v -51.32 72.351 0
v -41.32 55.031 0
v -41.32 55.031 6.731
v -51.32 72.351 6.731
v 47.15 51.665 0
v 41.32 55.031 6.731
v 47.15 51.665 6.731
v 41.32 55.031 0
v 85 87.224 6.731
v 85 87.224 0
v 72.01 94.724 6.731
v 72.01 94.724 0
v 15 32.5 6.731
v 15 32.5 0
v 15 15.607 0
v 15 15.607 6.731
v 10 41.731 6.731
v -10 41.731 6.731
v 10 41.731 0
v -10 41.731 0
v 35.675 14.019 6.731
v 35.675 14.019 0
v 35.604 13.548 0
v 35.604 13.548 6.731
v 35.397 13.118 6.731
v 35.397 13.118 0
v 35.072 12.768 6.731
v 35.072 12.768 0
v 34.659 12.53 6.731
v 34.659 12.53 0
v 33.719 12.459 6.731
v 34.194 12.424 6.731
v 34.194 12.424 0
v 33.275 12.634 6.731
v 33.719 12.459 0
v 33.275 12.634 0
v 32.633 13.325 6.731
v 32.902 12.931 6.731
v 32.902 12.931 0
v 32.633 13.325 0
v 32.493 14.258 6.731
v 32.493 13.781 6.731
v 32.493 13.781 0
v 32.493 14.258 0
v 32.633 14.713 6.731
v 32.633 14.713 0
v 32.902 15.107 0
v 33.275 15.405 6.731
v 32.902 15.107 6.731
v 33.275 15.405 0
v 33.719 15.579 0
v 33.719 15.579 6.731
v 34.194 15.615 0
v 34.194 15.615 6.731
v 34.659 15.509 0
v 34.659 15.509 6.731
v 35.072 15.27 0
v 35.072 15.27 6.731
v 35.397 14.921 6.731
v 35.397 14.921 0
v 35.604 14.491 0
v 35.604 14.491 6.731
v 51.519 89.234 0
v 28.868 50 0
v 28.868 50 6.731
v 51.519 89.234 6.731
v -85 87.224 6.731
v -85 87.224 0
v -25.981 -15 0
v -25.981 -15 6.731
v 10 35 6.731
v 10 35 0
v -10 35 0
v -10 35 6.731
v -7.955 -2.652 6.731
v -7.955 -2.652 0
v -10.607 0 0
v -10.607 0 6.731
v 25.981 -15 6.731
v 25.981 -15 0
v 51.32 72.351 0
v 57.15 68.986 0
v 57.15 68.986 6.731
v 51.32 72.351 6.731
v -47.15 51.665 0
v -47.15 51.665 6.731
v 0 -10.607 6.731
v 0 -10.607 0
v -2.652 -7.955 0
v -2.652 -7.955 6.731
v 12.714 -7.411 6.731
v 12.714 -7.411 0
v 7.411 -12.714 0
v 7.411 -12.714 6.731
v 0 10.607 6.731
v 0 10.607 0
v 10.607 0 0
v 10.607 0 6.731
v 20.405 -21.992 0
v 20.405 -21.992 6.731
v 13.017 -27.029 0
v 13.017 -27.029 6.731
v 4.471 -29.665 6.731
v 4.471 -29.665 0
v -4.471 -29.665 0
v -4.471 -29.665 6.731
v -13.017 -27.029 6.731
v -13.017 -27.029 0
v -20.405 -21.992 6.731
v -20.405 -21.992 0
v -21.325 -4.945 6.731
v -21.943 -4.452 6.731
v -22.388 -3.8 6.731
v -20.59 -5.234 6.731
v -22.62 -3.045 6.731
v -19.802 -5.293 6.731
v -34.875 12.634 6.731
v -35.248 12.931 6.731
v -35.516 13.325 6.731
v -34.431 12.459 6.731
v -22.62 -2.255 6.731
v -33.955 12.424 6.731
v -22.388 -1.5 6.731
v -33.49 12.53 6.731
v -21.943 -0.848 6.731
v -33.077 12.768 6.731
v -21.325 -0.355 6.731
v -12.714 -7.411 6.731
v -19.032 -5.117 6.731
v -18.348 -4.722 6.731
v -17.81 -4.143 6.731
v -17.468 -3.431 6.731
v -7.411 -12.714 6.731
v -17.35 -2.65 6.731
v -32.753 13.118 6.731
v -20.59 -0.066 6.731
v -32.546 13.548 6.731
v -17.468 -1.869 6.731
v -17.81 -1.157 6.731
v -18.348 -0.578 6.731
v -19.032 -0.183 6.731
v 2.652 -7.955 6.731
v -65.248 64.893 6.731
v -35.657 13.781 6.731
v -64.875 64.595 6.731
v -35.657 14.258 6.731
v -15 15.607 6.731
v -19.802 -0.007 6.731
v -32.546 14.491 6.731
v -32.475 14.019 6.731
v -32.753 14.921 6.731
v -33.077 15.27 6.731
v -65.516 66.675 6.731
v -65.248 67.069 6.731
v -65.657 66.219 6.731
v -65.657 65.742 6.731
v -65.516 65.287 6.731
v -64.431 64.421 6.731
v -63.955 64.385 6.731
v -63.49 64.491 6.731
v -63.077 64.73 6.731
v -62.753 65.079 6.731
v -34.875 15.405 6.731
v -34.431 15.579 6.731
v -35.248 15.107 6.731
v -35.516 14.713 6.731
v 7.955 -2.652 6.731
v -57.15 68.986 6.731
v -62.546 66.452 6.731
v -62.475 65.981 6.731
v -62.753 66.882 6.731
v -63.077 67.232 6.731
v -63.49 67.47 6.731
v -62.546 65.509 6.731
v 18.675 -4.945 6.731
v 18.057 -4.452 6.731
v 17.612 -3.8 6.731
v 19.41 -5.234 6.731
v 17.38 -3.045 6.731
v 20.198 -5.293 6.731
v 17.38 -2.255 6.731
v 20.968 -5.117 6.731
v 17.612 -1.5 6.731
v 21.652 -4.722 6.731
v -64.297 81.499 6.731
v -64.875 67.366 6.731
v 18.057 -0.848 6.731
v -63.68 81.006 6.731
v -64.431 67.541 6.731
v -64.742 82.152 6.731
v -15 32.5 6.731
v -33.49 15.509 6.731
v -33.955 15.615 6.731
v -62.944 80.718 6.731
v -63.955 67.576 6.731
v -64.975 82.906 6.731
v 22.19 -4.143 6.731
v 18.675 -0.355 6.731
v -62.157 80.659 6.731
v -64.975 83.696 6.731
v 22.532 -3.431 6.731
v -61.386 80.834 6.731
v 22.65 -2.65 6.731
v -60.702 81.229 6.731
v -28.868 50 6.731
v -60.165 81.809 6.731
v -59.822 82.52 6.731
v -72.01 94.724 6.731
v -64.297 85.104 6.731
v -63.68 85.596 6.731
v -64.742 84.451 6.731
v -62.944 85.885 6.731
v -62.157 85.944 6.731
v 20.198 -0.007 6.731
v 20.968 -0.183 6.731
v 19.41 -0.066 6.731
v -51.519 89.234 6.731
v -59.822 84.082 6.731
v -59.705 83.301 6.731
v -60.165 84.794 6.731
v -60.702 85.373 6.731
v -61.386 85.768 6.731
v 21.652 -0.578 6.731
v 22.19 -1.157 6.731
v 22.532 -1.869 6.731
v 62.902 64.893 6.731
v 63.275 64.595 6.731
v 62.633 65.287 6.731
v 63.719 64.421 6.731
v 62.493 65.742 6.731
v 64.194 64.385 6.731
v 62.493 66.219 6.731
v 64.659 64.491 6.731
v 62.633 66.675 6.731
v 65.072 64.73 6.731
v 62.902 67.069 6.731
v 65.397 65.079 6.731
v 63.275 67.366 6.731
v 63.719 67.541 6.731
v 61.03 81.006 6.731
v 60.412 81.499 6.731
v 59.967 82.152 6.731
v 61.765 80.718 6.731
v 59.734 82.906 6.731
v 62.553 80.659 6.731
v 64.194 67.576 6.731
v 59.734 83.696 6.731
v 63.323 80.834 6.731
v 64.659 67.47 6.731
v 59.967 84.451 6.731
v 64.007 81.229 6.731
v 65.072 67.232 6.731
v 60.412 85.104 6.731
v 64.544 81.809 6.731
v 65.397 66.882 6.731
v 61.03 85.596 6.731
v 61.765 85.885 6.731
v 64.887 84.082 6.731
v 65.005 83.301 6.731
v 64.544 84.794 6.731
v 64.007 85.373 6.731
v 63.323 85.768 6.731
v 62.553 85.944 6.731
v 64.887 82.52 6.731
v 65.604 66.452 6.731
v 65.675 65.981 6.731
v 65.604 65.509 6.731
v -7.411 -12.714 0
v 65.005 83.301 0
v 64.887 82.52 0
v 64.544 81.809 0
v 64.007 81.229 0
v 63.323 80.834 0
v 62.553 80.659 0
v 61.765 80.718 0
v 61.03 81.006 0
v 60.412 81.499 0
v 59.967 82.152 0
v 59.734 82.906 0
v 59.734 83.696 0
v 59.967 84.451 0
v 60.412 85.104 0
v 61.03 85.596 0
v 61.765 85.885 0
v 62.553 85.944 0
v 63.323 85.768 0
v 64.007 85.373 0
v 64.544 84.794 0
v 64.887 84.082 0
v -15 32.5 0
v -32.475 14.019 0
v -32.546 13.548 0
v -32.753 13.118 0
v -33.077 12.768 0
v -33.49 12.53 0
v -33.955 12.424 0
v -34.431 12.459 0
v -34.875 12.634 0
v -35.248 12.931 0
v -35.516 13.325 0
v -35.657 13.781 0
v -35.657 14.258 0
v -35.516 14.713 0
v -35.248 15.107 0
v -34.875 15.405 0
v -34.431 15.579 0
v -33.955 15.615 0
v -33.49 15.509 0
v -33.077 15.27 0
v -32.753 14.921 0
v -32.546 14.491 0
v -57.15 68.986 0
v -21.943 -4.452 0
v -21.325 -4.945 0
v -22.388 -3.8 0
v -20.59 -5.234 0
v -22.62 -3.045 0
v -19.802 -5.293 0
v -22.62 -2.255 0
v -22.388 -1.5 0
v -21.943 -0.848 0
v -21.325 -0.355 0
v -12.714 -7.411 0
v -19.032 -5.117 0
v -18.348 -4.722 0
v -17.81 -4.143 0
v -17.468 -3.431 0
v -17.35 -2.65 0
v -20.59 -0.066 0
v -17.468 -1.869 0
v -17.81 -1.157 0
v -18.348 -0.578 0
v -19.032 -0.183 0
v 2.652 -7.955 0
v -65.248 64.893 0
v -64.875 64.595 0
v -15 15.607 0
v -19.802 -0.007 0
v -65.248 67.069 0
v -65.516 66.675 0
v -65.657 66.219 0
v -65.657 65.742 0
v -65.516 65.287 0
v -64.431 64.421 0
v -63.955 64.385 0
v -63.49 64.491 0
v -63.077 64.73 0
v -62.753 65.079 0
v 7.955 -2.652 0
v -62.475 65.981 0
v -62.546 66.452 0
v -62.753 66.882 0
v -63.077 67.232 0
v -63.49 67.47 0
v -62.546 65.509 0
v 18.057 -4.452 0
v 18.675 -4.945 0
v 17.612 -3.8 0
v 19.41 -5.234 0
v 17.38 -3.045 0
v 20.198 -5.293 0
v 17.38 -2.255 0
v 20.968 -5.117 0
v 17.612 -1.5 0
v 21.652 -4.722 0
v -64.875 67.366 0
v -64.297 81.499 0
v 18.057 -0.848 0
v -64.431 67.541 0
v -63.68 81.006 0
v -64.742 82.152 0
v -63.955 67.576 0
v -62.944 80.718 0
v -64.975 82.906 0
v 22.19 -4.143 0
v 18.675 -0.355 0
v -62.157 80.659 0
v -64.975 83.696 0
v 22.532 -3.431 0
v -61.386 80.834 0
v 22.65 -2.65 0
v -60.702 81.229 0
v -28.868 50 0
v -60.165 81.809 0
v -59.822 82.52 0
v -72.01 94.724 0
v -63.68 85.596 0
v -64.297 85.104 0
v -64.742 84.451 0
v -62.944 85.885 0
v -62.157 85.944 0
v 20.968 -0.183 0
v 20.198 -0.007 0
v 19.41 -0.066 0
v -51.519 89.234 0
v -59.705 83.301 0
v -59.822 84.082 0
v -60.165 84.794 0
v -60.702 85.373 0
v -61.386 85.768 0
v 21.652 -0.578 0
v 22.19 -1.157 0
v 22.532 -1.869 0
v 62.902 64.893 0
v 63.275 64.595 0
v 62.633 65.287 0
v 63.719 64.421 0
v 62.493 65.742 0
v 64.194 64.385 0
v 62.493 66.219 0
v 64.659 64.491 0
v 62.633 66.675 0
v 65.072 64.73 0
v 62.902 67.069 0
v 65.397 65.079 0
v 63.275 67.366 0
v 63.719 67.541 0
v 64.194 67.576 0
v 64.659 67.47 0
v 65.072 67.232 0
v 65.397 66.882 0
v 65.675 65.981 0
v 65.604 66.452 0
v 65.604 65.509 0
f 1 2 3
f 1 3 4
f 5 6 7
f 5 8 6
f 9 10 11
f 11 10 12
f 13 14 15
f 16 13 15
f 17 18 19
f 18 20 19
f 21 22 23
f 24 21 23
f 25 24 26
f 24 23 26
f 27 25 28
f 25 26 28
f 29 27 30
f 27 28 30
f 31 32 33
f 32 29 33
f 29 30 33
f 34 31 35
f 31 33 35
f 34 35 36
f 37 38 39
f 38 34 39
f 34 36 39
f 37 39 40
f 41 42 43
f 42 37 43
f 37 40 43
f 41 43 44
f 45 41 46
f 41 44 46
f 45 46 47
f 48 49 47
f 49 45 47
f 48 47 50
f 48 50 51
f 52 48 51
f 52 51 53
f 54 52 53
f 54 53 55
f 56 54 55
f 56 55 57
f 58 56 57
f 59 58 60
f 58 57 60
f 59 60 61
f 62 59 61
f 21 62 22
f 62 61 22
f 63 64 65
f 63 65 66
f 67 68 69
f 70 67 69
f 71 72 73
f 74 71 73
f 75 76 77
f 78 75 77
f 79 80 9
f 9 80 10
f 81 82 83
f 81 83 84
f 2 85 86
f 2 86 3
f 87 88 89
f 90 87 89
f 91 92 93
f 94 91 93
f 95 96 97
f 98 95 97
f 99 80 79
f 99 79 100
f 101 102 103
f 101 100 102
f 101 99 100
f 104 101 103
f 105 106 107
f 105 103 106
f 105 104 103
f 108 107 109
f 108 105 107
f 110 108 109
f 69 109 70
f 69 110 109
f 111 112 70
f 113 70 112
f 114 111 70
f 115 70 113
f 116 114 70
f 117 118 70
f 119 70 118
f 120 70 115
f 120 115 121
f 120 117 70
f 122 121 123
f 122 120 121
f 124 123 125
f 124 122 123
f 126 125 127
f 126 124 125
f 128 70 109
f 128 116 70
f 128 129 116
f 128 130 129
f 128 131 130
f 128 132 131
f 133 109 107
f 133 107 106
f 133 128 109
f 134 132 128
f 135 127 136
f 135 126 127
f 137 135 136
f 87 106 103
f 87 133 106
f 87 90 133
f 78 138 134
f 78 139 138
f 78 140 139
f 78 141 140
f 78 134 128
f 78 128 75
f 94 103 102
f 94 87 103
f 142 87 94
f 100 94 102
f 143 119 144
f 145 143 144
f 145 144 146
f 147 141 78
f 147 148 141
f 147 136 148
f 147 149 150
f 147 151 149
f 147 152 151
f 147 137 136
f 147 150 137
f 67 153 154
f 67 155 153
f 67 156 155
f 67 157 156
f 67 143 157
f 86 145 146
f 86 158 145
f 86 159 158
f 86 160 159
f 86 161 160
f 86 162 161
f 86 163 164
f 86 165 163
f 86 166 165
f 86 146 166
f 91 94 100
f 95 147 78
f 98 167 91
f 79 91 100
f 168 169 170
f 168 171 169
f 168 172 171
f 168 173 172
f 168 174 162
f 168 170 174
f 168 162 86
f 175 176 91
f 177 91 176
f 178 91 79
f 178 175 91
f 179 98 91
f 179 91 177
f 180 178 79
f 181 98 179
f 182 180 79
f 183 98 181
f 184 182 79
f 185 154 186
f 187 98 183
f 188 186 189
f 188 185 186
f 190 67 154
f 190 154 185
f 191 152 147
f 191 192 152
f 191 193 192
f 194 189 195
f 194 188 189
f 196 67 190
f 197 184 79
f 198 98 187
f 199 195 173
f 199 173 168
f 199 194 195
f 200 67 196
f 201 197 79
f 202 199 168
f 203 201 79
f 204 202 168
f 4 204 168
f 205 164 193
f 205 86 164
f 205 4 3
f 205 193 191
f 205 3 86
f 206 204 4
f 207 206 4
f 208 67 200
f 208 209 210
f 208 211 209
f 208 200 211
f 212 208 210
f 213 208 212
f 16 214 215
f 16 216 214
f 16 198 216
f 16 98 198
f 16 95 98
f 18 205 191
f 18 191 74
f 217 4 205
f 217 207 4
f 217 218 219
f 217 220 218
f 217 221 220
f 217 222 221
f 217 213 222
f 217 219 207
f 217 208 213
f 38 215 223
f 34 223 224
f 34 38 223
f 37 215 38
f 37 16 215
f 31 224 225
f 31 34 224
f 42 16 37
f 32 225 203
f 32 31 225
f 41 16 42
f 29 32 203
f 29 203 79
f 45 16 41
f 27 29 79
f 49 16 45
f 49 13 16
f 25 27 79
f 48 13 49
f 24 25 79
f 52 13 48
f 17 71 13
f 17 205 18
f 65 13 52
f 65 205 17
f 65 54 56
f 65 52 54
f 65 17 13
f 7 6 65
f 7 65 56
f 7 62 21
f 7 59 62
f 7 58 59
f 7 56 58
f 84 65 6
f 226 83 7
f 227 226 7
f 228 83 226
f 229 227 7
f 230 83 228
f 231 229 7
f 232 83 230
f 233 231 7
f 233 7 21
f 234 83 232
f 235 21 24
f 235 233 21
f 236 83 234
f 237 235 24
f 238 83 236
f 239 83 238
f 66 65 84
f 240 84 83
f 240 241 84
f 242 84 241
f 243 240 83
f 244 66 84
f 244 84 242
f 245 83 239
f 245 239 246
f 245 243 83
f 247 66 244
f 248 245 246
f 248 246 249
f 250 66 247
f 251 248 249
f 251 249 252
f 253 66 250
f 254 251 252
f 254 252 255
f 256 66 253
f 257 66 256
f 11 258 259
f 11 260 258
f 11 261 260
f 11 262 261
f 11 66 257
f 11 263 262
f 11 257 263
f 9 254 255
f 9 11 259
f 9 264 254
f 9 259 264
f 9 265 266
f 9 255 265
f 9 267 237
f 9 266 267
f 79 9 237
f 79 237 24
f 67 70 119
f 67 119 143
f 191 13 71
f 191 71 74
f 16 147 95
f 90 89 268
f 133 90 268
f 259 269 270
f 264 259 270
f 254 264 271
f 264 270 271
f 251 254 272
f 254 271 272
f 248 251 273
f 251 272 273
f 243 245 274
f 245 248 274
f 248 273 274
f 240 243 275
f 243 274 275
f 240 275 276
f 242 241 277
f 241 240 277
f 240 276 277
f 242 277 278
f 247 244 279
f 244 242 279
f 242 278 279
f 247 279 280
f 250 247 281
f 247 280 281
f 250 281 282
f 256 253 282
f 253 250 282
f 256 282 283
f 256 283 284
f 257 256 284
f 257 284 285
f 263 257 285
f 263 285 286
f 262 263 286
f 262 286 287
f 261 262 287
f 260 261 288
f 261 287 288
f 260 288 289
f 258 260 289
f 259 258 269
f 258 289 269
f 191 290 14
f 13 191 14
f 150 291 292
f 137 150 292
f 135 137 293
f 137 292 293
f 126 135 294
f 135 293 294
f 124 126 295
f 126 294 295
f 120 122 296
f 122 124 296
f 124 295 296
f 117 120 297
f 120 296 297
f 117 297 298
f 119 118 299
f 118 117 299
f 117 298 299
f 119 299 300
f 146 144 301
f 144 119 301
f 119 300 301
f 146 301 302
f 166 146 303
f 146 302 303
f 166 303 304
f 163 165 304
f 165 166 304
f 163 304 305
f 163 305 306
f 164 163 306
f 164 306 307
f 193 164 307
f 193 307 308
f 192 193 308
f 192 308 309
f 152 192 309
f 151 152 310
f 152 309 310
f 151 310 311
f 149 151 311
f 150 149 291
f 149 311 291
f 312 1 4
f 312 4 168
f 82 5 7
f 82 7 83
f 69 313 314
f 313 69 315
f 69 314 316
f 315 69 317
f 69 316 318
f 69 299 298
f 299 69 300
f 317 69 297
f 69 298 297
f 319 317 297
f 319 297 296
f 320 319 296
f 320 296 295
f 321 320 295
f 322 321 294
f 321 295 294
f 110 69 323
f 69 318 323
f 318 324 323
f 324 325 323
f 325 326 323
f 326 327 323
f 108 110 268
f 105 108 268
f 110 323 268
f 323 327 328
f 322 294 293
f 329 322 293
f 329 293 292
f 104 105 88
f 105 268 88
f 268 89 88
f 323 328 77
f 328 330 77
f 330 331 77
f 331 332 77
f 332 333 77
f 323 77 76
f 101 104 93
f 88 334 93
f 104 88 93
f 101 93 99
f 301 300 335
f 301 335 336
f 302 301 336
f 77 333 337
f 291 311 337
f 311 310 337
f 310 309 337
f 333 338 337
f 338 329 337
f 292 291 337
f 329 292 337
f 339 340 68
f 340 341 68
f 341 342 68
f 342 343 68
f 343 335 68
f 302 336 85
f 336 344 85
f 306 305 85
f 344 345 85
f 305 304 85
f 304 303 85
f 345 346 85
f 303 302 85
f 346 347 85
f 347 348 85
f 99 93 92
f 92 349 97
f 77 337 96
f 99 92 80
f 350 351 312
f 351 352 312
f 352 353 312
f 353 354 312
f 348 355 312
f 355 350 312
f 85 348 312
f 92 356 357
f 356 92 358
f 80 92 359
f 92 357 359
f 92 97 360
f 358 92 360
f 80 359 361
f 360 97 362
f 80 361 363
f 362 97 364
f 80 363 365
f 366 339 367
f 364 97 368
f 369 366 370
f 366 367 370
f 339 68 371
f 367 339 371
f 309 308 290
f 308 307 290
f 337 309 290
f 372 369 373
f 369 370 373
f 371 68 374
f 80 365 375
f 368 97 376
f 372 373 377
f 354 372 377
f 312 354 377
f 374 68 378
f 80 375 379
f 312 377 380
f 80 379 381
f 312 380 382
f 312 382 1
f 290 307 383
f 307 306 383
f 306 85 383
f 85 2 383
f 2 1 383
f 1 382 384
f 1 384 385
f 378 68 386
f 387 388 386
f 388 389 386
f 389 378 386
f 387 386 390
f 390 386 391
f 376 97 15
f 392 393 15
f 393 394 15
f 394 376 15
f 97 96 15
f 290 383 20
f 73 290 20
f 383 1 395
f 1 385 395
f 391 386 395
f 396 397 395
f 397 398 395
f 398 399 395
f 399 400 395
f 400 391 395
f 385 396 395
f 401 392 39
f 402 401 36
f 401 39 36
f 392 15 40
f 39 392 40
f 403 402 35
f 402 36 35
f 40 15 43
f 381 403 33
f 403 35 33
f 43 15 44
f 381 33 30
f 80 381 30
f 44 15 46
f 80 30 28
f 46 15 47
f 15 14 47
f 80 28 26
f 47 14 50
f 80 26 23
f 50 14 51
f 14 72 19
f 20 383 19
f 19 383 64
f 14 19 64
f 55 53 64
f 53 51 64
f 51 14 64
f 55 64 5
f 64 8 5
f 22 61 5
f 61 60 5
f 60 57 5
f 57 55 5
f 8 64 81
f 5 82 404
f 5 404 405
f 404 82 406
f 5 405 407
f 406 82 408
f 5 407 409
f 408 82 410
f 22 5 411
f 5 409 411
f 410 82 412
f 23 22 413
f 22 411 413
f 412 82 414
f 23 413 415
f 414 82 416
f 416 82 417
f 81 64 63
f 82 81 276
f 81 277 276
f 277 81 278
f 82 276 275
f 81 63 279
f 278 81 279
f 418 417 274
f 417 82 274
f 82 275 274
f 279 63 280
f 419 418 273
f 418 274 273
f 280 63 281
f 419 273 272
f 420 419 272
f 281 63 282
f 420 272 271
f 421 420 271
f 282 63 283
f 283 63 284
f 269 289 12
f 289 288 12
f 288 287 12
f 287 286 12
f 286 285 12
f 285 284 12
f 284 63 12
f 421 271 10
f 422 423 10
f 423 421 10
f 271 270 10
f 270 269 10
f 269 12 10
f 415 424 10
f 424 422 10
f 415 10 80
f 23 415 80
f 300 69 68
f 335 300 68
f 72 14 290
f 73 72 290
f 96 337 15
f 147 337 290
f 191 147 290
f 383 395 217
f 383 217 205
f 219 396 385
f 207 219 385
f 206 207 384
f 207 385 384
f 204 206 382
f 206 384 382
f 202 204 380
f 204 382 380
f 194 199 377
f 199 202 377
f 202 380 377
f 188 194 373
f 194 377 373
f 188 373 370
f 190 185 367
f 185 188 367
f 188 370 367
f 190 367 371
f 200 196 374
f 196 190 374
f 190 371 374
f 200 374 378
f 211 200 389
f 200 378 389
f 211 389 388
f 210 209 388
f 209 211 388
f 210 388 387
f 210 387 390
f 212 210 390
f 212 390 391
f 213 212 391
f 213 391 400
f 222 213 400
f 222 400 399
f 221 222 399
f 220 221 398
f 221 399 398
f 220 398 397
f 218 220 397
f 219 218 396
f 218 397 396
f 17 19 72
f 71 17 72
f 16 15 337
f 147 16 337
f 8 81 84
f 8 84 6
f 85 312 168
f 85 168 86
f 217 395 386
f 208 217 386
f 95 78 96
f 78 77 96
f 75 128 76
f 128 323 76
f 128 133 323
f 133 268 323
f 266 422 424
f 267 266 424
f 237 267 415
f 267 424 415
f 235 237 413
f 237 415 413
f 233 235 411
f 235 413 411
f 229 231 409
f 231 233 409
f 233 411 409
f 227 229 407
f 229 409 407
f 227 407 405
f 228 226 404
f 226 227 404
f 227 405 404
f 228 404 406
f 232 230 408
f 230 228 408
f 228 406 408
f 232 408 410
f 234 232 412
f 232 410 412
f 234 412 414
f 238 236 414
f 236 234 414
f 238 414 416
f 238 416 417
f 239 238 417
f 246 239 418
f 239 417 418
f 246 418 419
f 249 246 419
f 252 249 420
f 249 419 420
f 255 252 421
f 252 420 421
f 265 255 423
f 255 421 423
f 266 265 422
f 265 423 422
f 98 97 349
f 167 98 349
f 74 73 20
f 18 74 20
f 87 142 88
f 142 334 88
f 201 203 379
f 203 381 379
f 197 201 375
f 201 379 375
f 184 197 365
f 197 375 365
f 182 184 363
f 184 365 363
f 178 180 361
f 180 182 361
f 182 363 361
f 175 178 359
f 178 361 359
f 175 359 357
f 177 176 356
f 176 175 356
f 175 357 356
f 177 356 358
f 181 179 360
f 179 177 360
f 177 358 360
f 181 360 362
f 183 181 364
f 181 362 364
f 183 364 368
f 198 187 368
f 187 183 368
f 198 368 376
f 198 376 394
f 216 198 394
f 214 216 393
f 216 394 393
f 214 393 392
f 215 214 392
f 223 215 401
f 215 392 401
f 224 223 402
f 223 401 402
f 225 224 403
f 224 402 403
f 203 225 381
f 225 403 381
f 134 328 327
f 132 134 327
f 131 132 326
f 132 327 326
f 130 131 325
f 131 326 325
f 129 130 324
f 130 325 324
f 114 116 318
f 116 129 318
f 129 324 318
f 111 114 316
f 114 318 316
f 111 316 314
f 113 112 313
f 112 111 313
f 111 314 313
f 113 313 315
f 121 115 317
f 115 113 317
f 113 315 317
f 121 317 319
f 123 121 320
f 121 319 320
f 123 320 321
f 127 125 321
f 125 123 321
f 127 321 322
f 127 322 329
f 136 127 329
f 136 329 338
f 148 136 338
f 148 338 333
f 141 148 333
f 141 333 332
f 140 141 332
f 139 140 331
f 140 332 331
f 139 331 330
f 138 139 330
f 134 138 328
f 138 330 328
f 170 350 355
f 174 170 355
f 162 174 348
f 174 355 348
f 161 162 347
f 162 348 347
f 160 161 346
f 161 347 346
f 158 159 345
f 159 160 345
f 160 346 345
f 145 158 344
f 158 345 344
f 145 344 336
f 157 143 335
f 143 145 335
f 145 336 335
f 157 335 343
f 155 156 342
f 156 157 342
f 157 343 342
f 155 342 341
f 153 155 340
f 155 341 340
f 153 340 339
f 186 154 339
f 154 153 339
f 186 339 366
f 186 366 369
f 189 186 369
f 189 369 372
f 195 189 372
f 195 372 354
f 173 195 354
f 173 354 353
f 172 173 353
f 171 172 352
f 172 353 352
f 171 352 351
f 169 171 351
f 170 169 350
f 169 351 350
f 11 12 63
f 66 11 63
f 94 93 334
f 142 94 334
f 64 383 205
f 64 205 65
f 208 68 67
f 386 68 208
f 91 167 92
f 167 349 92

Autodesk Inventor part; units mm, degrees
ref_plane "YZ Plane" through (0, 0, 0) normal (1, 0, 0) x (0, 1, 0)
ref_plane "XZ Plane" through (0, 0, 0) normal (0, 1, 0) x (-1, 0, 0)
ref_plane "XY Plane" through (0, 0, 0) normal (0, 0, 1) x (1, 0, 0)
sketch "Sketch1" plane through (0, 0, 0) normal (0, 0, 1) x (1, 0, 0)
  line L0 (-10.6066, 0) -> (0, 10.6066)
  line L1 (0, 10.6066) -> (10.6066, 0)
  line L2 (10.6066, 0) -> (0, -10.6066)
  line L3 (0, -10.6066) -> (-10.6066, 0)
  arc A0 (-25.9808, -15) -> (25.9808, -15) centre (0, 0) ccw
  line L4 (25.9808, -15) -> (85, 87.2243)
  line L5 (10, 41.731) -> (10, 35)
  line L6 (10, 35) -> (-10, 35)
  line L7 (-10, 35) -> (-10, 41.731)
  line L8 (-10, 41.731) -> (10, 41.731)
  line L9 (-85, 87.2243) -> (-25.9808, -15)
  circle A1 centre (-49.0748, 40) radius 1.6
  circle A2 centre (-64.0748, 65.9808) radius 1.6
  circle A3 centre (49.0748, 40) radius 1.6
  circle A4 centre (64.0748, 65.9808) radius 1.6
  line L10 (-85, 87.2243) -> (-72.0096, 94.7243)
  line L11 (-51.5192, 89.2339) -> (-28.8675, 50)
  line L12 (-28.8675, 50) -> (28.8675, 50)
  line L13 (28.8675, 50) -> (51.5192, 89.2339)
  line L14 (2.6517, -7.955) -> (7.955, -2.6517)
  line L15 (7.955, -2.6517) -> (12.7145, -7.4112)
  line L16 (12.7145, -7.4112) -> (7.4112, -12.7145)
  line L17 (7.4112, -12.7145) -> (2.6517, -7.955)
  line L18 (-2.6517, -7.955) -> (-7.4112, -12.7145)
  line L19 (-7.4112, -12.7145) -> (-12.7145, -7.4112)
  line L20 (-12.7145, -7.4112) -> (-7.955, -2.6517)
  line L21 (-7.955, -2.6517) -> (-2.6517, -7.955)
  circle A5 centre (-37.3546, 40) radius 2.65
  circle A6 centre (37.3546, 40) radius 2.65
  circle A7 centre (-62.3546, 83.3013) radius 2.65
  circle A8 centre (62.3546, 83.3013) radius 2.65
  circle A9 centre (-20, -2.65) radius 2.65
  circle A10 centre (20, -2.65) radius 2.65
  line L22 (-57.1495, 68.9859) -> (-47.1495, 51.6654)
  line L23 (-47.1495, 51.6654) -> (-41.3203, 55.0309)
  line L24 (-41.3203, 55.0309) -> (-51.3203, 72.3514)
  line L25 (-51.3203, 72.3514) -> (-57.1495, 68.9859)
  line L26 (47.1495, 51.6654) -> (57.1495, 68.9859)
  line L27 (57.1495, 68.9859) -> (51.3203, 72.3514)
  line L28 (51.3203, 72.3514) -> (41.3203, 55.0309)
  line L29 (41.3203, 55.0309) -> (47.1495, 51.6654)
  line L30 (-15, 32.5) -> (15, 32.5)
  line L31 (15, 32.5) -> (15, 15.6066)
  line L32 (15, 15.6066) -> (-15, 15.6066)
  line L33 (-15, 15.6066) -> (-15, 32.5)
  line L34 (-10.6066, 0) -> (10.6066, 0)
  line L35 (25.9808, -15) -> (0, -60)
  line L36 (0, -60) -> (-25.9808, -15)
  line L37 (85, 87.2243) -> (72.0096, 94.7243)
  circle A11 centre (-34.0748, 14.0192) radius 1.6
  circle A12 centre (34.0748, 14.0192) radius 1.6
  line L38 (72.0096, 94.7243) -> (51.5192, 89.2339)
  line L39 (-51.5192, 89.2339) -> (-72.0096, 94.7243)
  point P0 (0, 0)
  point P1 (0, 35)
  point P2 (0, 32.5)
  dimension "d0" = 15
  dimension "d9" = 30
  dimension "d11" = 6.731
  dimension "d12" = 20
  dimension "d25" = 60
  dimension "d34" = 3.2
  dimension "d36" = 30
  dimension "d38" = 30
  dimension "d40" = 7.5
  dimension "d41" = 7.5
  dimension "d42" = 7.5
  dimension "d43" = 7.5
  dimension "d45" = 40
  dimension "d54" = 50
  dimension "d55" = 0
  dimension "d56" = 0
  dimension "d57" = 7.5
  dimension "d58" = 3.75
  dimension "d63" = 15
  dimension "d64" = 5.3
  dimension "d66" = 50
  dimension "d67" = 15
  dimension "d68" = 15
  dimension "d73" = 20
  dimension "d74" = 15
  dimension "d75" = 15
  dimension "d76" = 15
  dimension "d77" = 15
  dimension "d79" = 35
  dimension "d80" = 2.5
  dimension "d81" = 5
  dimension "d82" = 30
  dimension "d83" = 20
  dimension "d84" = 20
  dimension "d85" = 40
  dimension "d86" = 170
  dimension "d88" = 30
  dimension "d89" = 30
  dimension "d90" = 7.5
  dimension "d91" = 7.5
  dimension "d92" = 135
  dimension "d93" = 30
  dimension "d94" = 45
  dimension "d95" = 15
extrude "Extrusion2" add sketch "Sketch1" along normal blind 6.731 contours L9 L10 L39 L11 L12 L13 L38 L37 L4 A0 | A5 | A6
sketch "Sketch2" plane through (0, 0, 6.731) normal (0, 0, 1) x (1, 0, 0)
  circle A0 centre (49.0748, 40) radius 1.6 projected
  circle A1 centre (-49.0748, 40) radius 1.6 projected
extrude "Extrusion3" add sketch "Sketch2" against normal up to surface (6.731 mm away)
equation "\"d38\" = d36"
equation "\"d41\" = d40"
equation "\"d58\" = 0.5 * d57"
equation "\"THICKA\" = 3.175"
equation "\"THICKB\" = 6.731"
equation "\"THICKC\" = 12.7"
equation "\"BALLDIA\" = 12"
equation "\"MAGDIA\" = 9.5"
equation "\"THICKPLY\" = 5"
properties part number "Frame_Lower_Plate_Bottom"
